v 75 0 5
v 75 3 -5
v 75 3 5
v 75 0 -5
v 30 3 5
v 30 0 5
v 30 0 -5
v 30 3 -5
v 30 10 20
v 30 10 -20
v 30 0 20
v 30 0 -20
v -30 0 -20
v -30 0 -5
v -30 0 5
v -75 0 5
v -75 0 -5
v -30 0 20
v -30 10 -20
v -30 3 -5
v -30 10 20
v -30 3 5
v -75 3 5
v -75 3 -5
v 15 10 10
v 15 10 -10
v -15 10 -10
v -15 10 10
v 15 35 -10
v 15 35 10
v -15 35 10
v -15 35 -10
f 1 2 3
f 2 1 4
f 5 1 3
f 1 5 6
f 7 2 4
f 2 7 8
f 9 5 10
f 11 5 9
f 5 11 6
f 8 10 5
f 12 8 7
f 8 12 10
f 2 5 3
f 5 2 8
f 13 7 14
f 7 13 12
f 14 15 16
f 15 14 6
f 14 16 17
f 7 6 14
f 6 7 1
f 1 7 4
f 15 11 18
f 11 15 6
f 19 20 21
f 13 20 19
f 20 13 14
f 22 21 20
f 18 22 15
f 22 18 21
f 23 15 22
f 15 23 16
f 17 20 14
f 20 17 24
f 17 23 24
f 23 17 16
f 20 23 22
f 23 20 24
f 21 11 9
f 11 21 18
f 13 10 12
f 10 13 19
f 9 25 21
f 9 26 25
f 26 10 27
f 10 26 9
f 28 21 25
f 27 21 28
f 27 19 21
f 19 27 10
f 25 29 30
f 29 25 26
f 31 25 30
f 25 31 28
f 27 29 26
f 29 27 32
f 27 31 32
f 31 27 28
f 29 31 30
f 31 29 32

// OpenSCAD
//
// ============================================================================
// SteamMachine UM790
// Project Phoenix
//
// Archivo  : rc522.scad
// Versión  : 1.0
// Fecha    : 2026-08-03
//
// Volumen mecánico de referencia del lector RC522 (MFRC522) y de su
// soporte a ambos laterales del chasis, para el ensamblaje virtual v1.
//
// NO ES UNA PIEZA IMPRIMIBLE.
//
// Requisitos de posicionamiento (ver openscad/reference/virtual_assembly_v1.scad):
//   - Centrado horizontalmente.
//   - A media altura del panel frontal superior intercambiable (panel NFC).
//   - Sujeto mediante un soporte a ambos laterales del chasis (no al panel,
//     para que el panel se pueda cambiar sin desconectar el lector).
//
// Sistema de coordenadas LOCAL de este módulo:
//   Origen (0,0,0) = centro de la placa del lector en X/Z, cara frontal
//                     (la que queda más cerca del panel intercambiable).
//   +X = hacia el lateral derecho del chasis.
//   +Y = hacia el interior del chasis (alejándose del panel).
//   +Z = hacia arriba.
//
// half_case_width se recibe como parámetro para poder dimensionar los
// brazos del soporte hasta las paredes laterales sin duplicar la lógica
// de posicionamiento del chasis en este módulo.
//
// ============================================================================

include <../../../00_parametros.scad>;

$fn = 32;

part_version = "1.0";


//=============================================================================
// COLORES
//=============================================================================

rc522BoardColor   = [0.10,0.35,0.10,1.0];
rc522BracketColor = [0.60,0.60,0.60,1.0];
rc522CableColor   = [1.00,0.65,0.00,0.15];


//=============================================================================
// PLACA DEL LECTOR
//=============================================================================

module rc522Board()
{

    color(rc522BoardColor)

    translate([
        -nfc_reader_width/2,
        0,
        -nfc_reader_height/2
    ])

        cube([
            nfc_reader_width,
            nfc_reader_depth,
            nfc_reader_height
        ]);

}


//=============================================================================
// SOPORTE A AMBOS LATERALES DEL CHASIS
//
// Dos brazos que van desde el borde de la placa hasta la cara interior
// de cada pared lateral del chasis (case_width/2 - wall_thickness).
//=============================================================================

module rc522Bracket(interiorHalfWidth = case_width/2 - wall_thickness)
{

    armLength = interiorHalfWidth - nfc_reader_width/2;

    color(rc522BracketColor)
    {

        // Brazo derecho
        translate([
            nfc_reader_width/2,
            0,
            -rc522_bracket_width/2
        ])
        cube([
            armLength,
            rc522_bracket_thickness,
            rc522_bracket_width
        ]);

        // Brazo izquierdo
        translate([
            -nfc_reader_width/2 - armLength,
            0,
            -rc522_bracket_width/2
        ])
        cube([
            armLength,
            rc522_bracket_thickness,
            rc522_bracket_width
        ]);

    }

}


//=============================================================================
// CUERPO MECÁNICO (para comprobación de colisiones "duras")
//=============================================================================

module rc522Body()
{

    union()
    {
        rc522Board();
        rc522Bracket();
    }

}


//=============================================================================
// VOLUMEN DE SEGURIDAD DE CABLEADO
//
// Espacio reservado tras la placa para el conexionado hacia el
// adaptador ESP32 (SPI + alimentación).
//=============================================================================

module rc522CableKeepout(length = 25)
{

    color(rc522CableColor)

    translate([
        -nfc_reader_width/4,
        nfc_reader_depth,
        -10
    ])

        cube([
            nfc_reader_width/2,
            length,
            20
        ]);

}


//=============================================================================
// CONJUNTO COMPLETO (visualización)
//=============================================================================

module rc522()
{

    rc522Body();

    rc522CableKeepout();

}


//=============================================================================
// PREVIEW
//=============================================================================

rc522();
